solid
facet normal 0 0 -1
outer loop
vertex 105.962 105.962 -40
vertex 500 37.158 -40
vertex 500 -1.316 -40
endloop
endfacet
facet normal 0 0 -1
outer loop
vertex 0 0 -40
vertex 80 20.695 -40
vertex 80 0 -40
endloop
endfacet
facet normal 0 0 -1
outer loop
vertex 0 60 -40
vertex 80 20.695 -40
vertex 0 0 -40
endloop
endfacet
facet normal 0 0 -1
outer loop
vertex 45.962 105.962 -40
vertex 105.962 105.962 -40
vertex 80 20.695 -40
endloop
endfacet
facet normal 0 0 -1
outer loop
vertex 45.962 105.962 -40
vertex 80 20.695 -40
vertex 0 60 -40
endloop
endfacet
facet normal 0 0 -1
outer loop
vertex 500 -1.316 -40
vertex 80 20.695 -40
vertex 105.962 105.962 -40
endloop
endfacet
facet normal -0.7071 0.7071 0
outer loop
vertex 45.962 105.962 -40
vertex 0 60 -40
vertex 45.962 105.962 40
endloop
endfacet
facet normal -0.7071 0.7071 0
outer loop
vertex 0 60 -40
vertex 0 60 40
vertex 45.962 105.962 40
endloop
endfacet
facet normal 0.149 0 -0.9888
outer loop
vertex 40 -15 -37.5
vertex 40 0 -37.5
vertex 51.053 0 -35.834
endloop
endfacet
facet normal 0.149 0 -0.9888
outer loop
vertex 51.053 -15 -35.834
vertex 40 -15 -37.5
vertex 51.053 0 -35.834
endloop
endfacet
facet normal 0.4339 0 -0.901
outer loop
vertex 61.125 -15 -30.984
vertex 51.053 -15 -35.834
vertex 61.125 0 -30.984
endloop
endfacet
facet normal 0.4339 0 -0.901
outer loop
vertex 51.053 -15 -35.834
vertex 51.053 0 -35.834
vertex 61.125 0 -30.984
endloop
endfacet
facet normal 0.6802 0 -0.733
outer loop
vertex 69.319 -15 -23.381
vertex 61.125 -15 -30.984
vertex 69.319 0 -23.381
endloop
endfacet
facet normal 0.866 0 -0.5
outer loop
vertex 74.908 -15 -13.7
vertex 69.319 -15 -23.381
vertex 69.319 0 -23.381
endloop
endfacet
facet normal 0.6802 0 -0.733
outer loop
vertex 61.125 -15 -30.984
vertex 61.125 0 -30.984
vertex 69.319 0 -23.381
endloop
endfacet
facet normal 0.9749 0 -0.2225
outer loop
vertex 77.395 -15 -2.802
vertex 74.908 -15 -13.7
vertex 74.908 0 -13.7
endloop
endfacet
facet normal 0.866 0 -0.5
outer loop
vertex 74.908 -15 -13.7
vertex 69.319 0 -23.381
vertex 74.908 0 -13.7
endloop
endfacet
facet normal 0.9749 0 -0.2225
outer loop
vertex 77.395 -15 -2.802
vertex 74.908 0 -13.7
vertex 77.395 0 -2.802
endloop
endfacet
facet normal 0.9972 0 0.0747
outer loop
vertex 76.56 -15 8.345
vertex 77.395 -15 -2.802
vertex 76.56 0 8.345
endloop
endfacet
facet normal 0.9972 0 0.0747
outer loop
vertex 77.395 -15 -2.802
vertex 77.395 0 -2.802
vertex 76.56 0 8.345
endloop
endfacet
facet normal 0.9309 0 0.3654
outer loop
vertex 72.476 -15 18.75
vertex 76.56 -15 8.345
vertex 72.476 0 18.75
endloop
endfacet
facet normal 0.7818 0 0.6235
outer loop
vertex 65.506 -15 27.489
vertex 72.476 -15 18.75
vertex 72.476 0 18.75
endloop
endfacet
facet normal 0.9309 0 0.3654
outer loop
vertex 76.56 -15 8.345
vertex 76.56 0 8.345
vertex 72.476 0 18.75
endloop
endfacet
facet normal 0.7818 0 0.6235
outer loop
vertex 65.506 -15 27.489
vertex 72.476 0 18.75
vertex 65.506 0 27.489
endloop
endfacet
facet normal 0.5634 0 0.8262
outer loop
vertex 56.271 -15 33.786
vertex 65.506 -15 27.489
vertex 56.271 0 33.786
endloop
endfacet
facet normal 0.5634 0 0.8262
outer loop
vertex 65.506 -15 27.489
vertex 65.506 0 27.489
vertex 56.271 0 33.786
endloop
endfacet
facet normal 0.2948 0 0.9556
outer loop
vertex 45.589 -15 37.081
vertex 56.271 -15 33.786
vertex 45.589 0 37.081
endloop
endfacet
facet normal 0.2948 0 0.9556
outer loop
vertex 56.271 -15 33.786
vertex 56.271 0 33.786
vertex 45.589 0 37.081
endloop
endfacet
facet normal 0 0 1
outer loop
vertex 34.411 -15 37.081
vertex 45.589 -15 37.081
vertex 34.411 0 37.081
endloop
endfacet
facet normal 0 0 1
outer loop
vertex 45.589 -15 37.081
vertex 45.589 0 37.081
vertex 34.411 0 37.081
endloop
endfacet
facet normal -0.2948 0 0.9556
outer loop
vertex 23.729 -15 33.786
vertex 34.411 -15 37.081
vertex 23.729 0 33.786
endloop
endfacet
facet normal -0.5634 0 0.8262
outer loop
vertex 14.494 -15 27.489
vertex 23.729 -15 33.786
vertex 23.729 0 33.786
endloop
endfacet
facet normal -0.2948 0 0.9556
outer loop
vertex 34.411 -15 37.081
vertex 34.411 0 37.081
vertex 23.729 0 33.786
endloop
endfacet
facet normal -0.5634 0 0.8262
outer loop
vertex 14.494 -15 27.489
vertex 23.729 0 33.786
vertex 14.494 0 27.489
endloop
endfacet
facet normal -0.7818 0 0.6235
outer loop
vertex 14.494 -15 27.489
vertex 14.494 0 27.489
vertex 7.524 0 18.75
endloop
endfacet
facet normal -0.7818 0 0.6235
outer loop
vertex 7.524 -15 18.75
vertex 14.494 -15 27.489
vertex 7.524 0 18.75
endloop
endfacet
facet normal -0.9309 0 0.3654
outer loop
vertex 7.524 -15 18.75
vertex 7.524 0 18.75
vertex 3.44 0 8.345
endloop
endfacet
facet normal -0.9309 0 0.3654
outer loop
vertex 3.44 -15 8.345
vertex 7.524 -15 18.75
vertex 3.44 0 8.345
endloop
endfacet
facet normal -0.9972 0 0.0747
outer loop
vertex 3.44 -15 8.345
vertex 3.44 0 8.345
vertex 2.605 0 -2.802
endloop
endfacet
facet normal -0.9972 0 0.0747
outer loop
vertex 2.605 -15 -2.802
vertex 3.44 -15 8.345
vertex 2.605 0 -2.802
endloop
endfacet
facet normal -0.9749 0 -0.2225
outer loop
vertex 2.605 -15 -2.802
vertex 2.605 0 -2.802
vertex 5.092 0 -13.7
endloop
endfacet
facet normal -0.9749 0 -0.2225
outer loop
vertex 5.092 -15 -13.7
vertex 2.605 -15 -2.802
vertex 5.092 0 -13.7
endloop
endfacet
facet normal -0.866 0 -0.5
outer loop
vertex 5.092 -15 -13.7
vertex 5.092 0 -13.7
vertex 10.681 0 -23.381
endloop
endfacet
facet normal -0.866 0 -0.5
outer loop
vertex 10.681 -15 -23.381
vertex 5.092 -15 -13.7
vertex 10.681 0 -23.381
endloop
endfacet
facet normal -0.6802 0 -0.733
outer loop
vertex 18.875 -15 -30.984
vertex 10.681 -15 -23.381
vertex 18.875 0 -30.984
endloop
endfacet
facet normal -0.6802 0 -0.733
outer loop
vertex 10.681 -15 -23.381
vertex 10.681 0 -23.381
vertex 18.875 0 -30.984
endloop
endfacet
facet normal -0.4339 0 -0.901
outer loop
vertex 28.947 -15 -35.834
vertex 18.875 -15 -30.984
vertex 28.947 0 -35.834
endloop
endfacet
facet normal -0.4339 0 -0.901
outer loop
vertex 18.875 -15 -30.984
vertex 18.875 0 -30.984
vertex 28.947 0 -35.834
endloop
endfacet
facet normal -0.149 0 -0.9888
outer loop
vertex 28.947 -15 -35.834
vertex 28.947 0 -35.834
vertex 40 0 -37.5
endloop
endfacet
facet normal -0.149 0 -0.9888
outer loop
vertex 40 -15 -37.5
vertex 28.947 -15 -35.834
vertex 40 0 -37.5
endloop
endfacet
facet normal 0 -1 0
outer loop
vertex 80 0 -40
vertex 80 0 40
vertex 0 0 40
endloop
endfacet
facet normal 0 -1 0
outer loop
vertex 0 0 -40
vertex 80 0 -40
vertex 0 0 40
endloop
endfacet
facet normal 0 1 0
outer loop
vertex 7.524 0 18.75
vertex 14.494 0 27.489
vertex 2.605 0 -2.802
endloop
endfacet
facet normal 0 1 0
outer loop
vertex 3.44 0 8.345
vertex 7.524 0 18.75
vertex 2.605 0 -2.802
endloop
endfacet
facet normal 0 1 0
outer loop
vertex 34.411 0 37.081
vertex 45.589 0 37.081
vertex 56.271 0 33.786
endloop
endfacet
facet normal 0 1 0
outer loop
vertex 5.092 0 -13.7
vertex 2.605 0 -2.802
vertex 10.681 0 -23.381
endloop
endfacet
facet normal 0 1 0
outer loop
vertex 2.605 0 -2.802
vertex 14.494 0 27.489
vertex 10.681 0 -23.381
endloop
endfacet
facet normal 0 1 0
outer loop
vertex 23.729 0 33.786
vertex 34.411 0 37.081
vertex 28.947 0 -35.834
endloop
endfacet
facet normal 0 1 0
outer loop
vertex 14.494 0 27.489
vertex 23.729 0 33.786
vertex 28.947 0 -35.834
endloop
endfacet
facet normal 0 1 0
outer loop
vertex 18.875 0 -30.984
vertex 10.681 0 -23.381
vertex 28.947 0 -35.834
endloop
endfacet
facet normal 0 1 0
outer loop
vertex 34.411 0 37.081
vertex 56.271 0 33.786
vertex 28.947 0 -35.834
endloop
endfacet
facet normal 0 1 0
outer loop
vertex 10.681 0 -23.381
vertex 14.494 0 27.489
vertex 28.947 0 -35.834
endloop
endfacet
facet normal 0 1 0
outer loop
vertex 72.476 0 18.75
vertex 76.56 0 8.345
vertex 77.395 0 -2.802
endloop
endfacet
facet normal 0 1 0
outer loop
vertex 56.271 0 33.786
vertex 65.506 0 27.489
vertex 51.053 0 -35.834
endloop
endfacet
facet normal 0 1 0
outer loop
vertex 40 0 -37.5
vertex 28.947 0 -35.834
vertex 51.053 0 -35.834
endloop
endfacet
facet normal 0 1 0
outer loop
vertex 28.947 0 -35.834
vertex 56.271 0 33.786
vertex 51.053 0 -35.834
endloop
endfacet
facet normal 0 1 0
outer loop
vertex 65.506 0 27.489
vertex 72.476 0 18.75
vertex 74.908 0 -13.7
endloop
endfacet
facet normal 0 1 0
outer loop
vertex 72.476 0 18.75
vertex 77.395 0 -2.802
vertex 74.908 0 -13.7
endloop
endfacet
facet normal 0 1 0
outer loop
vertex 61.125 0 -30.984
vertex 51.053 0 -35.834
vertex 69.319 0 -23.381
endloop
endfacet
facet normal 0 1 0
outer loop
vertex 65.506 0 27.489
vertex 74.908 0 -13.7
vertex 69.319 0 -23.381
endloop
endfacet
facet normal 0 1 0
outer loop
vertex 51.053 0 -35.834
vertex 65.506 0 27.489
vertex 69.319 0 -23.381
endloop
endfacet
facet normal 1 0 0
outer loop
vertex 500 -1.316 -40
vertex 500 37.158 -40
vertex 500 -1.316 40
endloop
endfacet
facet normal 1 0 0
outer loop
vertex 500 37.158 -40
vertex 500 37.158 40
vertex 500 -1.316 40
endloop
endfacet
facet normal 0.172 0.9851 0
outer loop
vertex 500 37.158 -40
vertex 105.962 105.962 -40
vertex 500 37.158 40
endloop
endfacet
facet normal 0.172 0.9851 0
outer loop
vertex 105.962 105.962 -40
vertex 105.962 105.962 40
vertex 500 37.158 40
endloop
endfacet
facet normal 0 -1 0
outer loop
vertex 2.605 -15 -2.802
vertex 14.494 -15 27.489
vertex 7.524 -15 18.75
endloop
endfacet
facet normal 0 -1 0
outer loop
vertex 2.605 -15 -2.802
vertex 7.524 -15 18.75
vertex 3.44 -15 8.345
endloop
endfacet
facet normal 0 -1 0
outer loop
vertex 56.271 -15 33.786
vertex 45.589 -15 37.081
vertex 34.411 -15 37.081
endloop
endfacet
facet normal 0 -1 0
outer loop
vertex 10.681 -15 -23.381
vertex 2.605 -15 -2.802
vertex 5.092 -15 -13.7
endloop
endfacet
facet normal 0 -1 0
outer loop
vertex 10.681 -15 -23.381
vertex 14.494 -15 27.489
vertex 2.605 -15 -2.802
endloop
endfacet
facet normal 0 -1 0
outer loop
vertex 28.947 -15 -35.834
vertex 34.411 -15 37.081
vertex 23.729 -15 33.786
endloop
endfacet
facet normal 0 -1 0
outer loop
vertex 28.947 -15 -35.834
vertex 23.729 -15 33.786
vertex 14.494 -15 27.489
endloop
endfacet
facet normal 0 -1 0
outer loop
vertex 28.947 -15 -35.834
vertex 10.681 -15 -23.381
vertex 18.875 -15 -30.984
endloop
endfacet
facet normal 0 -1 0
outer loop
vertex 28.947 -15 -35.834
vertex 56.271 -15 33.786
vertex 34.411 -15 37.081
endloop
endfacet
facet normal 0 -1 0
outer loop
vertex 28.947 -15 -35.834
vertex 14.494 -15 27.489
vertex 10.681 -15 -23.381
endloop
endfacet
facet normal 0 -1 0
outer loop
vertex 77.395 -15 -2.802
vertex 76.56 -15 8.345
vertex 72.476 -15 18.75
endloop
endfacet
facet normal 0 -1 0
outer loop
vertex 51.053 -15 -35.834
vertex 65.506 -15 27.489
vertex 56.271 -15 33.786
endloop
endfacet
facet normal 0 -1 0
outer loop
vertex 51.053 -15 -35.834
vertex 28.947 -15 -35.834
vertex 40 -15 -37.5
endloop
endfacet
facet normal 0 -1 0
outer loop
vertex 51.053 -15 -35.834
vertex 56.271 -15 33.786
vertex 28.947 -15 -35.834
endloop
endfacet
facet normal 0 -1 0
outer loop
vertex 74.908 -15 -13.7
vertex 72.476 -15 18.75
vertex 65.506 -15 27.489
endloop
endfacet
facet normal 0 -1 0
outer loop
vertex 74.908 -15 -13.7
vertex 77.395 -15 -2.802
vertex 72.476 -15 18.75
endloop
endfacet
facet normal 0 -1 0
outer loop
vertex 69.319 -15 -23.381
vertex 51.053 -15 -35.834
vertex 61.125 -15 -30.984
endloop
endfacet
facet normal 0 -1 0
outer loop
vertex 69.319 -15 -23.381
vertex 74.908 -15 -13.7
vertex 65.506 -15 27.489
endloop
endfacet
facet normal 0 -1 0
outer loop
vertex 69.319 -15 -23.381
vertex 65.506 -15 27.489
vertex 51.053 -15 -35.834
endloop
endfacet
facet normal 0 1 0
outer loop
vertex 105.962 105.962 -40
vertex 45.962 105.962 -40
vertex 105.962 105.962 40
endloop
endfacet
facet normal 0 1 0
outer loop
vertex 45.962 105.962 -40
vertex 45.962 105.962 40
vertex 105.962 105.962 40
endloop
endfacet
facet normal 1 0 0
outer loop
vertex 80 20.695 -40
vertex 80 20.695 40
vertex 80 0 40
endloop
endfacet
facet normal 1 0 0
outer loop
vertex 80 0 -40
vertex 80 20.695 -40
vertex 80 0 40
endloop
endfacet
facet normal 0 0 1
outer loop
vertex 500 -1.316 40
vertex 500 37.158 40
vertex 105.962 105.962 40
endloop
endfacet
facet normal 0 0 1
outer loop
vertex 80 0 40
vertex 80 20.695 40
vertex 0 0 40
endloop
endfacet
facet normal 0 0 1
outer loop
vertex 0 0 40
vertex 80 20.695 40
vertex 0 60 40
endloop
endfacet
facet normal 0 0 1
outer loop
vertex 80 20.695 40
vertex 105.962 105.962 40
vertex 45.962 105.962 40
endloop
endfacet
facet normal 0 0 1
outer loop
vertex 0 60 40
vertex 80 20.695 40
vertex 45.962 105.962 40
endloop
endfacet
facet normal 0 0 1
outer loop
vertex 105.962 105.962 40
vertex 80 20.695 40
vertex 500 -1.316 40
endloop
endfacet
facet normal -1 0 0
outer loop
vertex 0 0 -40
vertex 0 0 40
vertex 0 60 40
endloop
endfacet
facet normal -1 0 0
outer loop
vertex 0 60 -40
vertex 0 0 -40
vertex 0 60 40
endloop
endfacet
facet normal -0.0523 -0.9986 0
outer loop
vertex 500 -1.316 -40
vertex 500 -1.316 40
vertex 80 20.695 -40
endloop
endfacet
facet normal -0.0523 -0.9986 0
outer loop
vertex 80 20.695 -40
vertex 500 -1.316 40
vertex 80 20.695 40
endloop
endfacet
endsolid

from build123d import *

# Parameters (mm, degrees)
BOSS_EXTRUDE1_DEPTH = 40
SKETCH2_R           = 37.5
BOSS_EXTRUDE2_DEPTH = 15


with BuildPart() as part:
    # Sketch1 → Boss-Extrude1 (new, symmetric)
    with BuildSketch(Plane.XY):
        Polygon((0, 0), (0, 60), (45.961940777, 105.961940777), (105.961940777, 105.961940777), (500, 37.157813838), (500, -1.316470088), (80, 20.694797211), (80, 0), align=None)
    extrude(amount=BOSS_EXTRUDE1_DEPTH, both=True)


with BuildPart() as body_2:
    # Sketch2 → Boss-Extrude2 (new body)
    with BuildSketch(Plane.XZ):
        with Locations(Location((40, 0, 0), (0, 0, 270))):
            Circle(SKETCH2_R)
    extrude(amount=BOSS_EXTRUDE2_DEPTH)


solid = Compound([part.part, body_2.part])
